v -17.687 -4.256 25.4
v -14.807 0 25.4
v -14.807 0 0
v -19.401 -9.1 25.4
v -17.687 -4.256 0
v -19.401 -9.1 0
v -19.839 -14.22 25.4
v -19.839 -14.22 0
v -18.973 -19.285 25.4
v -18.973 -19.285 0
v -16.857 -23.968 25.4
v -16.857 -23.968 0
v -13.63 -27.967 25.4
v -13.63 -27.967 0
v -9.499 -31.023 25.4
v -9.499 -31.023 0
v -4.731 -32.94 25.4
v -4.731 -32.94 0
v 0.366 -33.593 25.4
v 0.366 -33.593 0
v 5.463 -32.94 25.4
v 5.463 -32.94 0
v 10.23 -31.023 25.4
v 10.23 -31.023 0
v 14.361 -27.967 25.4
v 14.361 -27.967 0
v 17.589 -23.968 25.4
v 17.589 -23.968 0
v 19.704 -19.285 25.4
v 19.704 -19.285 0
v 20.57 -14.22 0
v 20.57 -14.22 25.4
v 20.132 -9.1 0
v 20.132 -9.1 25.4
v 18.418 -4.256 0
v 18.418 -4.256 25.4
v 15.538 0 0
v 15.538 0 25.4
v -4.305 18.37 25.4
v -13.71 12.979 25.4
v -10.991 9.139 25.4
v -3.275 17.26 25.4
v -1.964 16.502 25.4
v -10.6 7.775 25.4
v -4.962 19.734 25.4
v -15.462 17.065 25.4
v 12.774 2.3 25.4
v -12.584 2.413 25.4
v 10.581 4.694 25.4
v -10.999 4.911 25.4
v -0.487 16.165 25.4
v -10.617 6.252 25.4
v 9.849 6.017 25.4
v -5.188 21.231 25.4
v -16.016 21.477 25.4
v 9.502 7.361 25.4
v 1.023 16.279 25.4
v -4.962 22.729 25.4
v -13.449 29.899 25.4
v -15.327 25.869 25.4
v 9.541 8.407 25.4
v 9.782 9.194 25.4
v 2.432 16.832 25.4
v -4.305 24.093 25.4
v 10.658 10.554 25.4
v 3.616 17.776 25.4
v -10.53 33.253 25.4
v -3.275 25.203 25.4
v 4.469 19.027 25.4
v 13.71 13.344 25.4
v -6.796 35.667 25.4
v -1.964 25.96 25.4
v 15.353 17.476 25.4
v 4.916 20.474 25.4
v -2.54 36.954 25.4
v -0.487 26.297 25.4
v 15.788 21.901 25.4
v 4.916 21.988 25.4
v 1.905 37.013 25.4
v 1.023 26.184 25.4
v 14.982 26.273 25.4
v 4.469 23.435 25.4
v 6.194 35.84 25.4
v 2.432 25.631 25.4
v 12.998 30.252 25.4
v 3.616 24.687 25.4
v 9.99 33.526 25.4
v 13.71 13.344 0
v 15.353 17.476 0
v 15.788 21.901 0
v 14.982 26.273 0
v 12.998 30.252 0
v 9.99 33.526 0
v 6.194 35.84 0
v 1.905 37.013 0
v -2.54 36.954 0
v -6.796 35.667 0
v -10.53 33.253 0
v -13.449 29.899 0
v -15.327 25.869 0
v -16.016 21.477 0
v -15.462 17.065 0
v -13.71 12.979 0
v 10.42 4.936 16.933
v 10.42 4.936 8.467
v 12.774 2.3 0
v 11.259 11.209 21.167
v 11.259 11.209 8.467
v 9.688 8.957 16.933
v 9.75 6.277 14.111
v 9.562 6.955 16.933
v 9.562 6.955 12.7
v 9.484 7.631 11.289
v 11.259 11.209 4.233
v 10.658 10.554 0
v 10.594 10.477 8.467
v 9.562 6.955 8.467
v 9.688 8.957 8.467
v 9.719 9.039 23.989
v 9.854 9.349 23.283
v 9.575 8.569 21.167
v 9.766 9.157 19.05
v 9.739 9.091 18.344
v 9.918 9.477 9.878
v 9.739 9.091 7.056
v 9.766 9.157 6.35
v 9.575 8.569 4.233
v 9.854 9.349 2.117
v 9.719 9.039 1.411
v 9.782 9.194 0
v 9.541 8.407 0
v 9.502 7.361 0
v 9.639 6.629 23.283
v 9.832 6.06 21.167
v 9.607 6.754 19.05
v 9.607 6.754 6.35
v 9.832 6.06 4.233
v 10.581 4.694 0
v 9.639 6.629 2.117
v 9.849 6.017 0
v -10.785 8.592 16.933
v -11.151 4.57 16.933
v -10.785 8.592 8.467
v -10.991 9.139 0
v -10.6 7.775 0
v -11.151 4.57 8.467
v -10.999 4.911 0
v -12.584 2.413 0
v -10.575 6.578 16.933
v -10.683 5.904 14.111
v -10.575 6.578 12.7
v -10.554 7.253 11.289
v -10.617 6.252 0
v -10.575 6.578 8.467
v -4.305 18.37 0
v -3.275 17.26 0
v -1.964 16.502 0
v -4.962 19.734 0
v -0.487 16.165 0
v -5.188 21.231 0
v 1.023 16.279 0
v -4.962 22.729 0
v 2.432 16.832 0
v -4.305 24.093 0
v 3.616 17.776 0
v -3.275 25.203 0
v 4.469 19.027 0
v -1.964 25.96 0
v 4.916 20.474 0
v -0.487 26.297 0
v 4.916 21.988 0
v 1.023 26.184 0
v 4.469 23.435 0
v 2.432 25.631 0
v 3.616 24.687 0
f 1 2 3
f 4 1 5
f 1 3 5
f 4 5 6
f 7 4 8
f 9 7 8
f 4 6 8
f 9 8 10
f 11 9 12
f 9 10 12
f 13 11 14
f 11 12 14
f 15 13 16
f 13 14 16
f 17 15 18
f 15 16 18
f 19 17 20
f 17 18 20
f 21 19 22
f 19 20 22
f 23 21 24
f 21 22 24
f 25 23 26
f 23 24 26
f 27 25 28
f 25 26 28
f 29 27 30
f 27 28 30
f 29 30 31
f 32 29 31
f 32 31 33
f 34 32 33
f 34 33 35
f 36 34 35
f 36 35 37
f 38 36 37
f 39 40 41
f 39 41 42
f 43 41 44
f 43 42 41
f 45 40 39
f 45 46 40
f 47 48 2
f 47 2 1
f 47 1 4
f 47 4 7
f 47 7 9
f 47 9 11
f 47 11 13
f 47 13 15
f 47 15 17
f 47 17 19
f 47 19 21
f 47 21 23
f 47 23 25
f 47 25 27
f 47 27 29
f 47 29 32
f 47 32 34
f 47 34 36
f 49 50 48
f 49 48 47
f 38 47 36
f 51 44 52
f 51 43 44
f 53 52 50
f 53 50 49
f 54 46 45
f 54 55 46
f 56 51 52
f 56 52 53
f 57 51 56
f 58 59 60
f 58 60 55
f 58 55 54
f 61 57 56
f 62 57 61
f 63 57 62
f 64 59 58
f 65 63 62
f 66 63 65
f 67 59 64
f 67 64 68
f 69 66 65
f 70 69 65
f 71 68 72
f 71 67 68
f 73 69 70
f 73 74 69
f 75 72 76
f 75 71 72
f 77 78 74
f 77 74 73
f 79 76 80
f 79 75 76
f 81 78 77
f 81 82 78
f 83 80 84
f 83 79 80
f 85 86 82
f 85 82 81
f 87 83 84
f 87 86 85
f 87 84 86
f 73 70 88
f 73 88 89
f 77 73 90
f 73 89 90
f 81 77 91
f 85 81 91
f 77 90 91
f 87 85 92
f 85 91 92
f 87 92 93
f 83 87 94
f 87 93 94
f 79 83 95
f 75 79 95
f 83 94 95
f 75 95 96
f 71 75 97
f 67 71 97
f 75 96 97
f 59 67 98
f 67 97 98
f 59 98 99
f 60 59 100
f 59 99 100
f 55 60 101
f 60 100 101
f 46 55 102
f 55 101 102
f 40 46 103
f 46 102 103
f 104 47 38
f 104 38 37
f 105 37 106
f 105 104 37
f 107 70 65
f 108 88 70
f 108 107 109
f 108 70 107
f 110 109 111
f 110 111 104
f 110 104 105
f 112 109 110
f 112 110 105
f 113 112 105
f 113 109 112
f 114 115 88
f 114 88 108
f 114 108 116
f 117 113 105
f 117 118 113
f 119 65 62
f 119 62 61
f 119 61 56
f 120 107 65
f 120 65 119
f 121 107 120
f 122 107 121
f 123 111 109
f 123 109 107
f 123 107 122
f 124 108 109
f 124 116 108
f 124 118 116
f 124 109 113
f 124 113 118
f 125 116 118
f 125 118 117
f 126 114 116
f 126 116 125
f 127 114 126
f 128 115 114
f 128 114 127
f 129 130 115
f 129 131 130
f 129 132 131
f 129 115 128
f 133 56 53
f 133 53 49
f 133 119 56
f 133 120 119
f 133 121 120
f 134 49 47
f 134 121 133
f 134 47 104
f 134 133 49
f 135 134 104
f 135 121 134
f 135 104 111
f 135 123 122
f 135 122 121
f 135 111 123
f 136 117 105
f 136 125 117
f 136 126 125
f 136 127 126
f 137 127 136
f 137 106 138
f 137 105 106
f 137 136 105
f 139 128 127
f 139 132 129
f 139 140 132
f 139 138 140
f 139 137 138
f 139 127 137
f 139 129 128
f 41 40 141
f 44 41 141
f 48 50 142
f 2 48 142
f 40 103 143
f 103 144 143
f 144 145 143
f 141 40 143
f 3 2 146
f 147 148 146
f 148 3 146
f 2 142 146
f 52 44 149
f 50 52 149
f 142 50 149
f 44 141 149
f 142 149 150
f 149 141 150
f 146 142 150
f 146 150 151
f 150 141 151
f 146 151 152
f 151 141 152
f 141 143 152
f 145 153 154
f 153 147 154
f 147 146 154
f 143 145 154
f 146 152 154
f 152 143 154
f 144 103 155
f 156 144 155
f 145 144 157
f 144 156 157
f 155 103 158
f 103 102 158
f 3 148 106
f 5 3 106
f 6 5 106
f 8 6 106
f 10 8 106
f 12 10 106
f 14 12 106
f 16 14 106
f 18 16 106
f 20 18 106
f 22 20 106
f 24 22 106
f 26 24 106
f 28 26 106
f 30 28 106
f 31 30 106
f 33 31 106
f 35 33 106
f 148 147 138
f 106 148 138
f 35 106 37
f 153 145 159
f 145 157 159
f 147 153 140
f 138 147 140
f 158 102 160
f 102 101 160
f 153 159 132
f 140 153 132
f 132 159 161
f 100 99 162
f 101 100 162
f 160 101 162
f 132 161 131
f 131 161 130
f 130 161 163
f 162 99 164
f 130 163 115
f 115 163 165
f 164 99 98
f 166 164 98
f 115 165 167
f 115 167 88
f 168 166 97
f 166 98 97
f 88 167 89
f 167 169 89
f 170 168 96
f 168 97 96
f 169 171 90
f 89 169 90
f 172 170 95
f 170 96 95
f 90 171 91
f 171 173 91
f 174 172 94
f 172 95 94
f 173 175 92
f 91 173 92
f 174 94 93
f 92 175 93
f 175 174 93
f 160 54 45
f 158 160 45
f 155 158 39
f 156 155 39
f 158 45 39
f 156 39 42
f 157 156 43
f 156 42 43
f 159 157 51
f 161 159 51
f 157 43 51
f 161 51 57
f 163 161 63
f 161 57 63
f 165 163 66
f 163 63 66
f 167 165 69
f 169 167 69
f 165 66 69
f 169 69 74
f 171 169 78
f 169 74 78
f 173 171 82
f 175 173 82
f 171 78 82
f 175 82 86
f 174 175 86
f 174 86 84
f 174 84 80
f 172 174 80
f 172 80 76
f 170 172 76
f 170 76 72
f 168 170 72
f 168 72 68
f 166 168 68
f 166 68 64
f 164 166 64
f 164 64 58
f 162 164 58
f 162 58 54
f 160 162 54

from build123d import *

# Parameters (mm, degrees)
F1_DEPTH = 25.4
F2_D     = 10.16


with BuildPart() as f1:
    # F0 (on Top) → F1 (new body)
    with BuildSketch(Plane.XY):
        with BuildLine():
            add(Edge.make_bspline(
                [(-13.7100163847, 12.9788173363), (-12.4863722513, 11.5414430545), (-10.1918765367, 8.8461748471), (-10.7057072132, 4.2242559095), (-13.3579996874, 1.4923212615), (-14.8068163544, 0)],
                knots=[0, 0, 0, 0, 0.3414517803, 0.6402675625, 1, 1, 1, 1], degree=3))
            ThreePointArc((-14.8068163544, 0), (0.3655990586, -33.5925494725), (15.5380144715, 0))
            add(Edge.make_bspline(
                [(13.7100145221, 13.3444173262), (11.9781094837, 11.9335853093), (8.8109129891, 9.353546497), (10.0241222697, 4.4047922136), (13.5389223726, 1.5969817671), (15.5380144715, 0)],
                knots=[0, 0, 0, 0, 0.3422584436, 0.6259002191, 1, 1, 1, 1], degree=3))
            ThreePointArc((13.7100145221, 13.3444173262), (-0.3197104944, 37.1398622542), (-13.7100163847, 12.9788173363))
        make_face()
    extrude(amount=F1_DEPTH)

    # F2 (through all)
    with Locations(Plane(origin=(0, 0, 0), x_dir=(1, 0, 0), z_dir=(0, 0, -1))):
        with Locations((-0.1075960341, -21.2312593567)):
            Hole(F2_D / 2)


solid = f1.part
